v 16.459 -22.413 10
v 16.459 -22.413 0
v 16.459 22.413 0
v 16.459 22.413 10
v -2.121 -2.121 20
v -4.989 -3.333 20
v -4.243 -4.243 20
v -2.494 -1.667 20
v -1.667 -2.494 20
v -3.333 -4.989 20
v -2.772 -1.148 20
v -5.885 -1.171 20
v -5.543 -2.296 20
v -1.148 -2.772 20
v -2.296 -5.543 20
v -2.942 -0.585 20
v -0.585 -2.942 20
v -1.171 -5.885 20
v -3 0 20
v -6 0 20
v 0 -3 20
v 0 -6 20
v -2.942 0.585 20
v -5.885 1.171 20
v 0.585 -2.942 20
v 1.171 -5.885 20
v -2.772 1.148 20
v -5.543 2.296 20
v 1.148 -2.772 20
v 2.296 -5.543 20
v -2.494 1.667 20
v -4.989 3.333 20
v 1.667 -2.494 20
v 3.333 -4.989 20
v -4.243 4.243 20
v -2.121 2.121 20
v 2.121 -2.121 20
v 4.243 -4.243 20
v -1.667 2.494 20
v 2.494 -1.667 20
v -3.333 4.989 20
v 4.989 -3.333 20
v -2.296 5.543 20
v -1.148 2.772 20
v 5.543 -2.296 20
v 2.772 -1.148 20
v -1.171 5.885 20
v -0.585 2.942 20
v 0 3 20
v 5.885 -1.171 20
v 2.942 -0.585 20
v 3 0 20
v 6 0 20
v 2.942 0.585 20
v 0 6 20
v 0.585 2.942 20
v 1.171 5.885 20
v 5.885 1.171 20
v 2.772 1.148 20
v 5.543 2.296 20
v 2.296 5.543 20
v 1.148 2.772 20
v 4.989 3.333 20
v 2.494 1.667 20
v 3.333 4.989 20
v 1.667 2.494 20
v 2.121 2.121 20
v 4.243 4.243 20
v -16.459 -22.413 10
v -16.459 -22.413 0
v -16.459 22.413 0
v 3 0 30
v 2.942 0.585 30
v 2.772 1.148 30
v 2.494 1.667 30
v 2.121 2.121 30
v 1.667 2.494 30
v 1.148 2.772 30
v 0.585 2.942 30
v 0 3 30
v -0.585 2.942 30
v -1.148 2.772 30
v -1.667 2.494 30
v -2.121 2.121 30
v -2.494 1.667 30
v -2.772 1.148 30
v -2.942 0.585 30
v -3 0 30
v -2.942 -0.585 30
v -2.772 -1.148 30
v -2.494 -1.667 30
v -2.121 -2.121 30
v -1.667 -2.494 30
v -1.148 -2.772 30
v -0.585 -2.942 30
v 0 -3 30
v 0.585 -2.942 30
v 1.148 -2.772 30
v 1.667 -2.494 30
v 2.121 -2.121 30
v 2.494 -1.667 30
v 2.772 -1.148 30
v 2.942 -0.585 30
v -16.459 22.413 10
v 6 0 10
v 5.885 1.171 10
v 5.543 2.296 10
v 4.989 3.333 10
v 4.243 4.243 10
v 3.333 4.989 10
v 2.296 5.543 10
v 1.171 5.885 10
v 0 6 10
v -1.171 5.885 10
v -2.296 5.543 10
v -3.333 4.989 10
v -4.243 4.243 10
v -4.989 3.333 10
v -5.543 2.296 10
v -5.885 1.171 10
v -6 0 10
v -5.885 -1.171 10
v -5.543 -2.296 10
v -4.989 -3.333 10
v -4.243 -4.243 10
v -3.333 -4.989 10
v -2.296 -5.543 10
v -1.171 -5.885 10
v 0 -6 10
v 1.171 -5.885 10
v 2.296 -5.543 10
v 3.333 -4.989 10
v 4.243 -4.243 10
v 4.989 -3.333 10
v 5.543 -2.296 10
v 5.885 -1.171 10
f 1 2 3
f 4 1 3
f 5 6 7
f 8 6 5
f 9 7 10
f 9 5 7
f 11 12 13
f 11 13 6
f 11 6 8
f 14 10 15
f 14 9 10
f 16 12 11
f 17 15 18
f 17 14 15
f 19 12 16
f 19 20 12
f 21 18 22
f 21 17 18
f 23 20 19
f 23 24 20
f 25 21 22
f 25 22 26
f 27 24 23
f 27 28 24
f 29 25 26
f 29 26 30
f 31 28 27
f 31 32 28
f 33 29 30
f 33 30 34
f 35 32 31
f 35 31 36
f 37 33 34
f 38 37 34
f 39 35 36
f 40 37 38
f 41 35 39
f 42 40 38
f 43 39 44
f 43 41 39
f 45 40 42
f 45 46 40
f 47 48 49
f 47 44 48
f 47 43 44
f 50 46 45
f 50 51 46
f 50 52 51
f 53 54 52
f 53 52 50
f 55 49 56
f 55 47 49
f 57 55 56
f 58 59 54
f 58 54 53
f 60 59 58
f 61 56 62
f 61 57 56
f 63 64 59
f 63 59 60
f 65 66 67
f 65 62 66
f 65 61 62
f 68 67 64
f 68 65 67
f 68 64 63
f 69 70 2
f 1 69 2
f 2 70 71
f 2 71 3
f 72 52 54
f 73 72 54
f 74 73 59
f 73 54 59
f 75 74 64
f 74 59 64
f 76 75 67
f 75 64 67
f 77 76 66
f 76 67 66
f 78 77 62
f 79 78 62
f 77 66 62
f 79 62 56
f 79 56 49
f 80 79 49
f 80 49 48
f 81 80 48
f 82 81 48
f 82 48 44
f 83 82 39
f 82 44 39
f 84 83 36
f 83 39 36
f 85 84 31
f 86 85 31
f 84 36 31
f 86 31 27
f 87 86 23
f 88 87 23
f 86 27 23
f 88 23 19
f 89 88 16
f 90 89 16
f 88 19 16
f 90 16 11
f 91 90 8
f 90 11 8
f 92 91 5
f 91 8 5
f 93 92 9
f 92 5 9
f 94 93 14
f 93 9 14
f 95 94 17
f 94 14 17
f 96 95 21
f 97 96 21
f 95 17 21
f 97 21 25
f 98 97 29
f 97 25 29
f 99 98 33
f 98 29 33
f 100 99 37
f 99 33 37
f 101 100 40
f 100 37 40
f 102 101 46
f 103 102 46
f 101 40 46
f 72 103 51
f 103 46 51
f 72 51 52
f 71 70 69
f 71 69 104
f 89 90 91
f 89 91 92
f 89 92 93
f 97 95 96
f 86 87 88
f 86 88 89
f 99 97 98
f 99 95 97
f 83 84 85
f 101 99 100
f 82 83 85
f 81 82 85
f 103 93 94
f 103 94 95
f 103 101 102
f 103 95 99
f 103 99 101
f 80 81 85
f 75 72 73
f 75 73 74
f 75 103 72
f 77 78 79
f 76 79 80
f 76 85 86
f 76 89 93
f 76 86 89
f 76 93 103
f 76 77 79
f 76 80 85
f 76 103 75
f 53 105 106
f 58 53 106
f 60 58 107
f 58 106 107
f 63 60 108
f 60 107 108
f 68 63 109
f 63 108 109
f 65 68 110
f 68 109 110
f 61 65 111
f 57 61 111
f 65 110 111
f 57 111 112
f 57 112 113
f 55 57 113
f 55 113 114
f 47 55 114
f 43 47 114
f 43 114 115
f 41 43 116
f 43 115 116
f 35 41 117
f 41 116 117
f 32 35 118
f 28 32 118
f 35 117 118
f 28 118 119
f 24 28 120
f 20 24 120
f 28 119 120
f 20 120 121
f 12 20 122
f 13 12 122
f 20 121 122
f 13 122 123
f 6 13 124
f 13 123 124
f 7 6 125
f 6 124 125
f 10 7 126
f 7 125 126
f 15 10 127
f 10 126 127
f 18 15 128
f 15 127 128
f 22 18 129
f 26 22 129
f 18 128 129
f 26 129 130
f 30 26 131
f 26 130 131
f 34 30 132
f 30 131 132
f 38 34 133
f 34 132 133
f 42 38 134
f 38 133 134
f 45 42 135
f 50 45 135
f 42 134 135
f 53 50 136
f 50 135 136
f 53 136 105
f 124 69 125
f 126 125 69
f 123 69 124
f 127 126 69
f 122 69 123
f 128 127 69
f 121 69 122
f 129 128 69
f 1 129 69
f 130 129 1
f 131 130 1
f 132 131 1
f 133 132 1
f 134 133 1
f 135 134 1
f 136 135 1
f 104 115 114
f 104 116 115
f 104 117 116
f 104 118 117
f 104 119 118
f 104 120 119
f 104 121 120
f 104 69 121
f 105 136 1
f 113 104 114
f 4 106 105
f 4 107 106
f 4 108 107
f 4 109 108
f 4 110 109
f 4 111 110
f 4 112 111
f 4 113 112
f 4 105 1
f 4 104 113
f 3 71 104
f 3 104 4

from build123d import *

# Parameters (mm, degrees)
SKETCH2_W           = 32.91869007
SKETCH2_H           = 44.826135242
BOSS_EXTRUDE1_DEPTH = 10
SKETCH3_R           = 6
BOSS_EXTRUDE2_DEPTH = 10
SKETCH4_R           = 3
BOSS_EXTRUDE3_DEPTH = 10


with BuildPart() as part:
    # Sketch2 → Boss-Extrude1 (new body)
    with BuildSketch(Plane.XY):
        Rectangle(SKETCH2_W, SKETCH2_H)
    extrude(amount=BOSS_EXTRUDE1_DEPTH)

    # Sketch3 → Boss-Extrude2 (add)
    with BuildSketch(Plane.XY.offset(10)):
        Circle(SKETCH3_R)
    extrude(amount=BOSS_EXTRUDE2_DEPTH)

    # Sketch4 → Boss-Extrude3 (add)
    with BuildSketch(Plane.XY.offset(20)):
        Circle(SKETCH4_R)
    extrude(amount=BOSS_EXTRUDE3_DEPTH)


solid = part.part
